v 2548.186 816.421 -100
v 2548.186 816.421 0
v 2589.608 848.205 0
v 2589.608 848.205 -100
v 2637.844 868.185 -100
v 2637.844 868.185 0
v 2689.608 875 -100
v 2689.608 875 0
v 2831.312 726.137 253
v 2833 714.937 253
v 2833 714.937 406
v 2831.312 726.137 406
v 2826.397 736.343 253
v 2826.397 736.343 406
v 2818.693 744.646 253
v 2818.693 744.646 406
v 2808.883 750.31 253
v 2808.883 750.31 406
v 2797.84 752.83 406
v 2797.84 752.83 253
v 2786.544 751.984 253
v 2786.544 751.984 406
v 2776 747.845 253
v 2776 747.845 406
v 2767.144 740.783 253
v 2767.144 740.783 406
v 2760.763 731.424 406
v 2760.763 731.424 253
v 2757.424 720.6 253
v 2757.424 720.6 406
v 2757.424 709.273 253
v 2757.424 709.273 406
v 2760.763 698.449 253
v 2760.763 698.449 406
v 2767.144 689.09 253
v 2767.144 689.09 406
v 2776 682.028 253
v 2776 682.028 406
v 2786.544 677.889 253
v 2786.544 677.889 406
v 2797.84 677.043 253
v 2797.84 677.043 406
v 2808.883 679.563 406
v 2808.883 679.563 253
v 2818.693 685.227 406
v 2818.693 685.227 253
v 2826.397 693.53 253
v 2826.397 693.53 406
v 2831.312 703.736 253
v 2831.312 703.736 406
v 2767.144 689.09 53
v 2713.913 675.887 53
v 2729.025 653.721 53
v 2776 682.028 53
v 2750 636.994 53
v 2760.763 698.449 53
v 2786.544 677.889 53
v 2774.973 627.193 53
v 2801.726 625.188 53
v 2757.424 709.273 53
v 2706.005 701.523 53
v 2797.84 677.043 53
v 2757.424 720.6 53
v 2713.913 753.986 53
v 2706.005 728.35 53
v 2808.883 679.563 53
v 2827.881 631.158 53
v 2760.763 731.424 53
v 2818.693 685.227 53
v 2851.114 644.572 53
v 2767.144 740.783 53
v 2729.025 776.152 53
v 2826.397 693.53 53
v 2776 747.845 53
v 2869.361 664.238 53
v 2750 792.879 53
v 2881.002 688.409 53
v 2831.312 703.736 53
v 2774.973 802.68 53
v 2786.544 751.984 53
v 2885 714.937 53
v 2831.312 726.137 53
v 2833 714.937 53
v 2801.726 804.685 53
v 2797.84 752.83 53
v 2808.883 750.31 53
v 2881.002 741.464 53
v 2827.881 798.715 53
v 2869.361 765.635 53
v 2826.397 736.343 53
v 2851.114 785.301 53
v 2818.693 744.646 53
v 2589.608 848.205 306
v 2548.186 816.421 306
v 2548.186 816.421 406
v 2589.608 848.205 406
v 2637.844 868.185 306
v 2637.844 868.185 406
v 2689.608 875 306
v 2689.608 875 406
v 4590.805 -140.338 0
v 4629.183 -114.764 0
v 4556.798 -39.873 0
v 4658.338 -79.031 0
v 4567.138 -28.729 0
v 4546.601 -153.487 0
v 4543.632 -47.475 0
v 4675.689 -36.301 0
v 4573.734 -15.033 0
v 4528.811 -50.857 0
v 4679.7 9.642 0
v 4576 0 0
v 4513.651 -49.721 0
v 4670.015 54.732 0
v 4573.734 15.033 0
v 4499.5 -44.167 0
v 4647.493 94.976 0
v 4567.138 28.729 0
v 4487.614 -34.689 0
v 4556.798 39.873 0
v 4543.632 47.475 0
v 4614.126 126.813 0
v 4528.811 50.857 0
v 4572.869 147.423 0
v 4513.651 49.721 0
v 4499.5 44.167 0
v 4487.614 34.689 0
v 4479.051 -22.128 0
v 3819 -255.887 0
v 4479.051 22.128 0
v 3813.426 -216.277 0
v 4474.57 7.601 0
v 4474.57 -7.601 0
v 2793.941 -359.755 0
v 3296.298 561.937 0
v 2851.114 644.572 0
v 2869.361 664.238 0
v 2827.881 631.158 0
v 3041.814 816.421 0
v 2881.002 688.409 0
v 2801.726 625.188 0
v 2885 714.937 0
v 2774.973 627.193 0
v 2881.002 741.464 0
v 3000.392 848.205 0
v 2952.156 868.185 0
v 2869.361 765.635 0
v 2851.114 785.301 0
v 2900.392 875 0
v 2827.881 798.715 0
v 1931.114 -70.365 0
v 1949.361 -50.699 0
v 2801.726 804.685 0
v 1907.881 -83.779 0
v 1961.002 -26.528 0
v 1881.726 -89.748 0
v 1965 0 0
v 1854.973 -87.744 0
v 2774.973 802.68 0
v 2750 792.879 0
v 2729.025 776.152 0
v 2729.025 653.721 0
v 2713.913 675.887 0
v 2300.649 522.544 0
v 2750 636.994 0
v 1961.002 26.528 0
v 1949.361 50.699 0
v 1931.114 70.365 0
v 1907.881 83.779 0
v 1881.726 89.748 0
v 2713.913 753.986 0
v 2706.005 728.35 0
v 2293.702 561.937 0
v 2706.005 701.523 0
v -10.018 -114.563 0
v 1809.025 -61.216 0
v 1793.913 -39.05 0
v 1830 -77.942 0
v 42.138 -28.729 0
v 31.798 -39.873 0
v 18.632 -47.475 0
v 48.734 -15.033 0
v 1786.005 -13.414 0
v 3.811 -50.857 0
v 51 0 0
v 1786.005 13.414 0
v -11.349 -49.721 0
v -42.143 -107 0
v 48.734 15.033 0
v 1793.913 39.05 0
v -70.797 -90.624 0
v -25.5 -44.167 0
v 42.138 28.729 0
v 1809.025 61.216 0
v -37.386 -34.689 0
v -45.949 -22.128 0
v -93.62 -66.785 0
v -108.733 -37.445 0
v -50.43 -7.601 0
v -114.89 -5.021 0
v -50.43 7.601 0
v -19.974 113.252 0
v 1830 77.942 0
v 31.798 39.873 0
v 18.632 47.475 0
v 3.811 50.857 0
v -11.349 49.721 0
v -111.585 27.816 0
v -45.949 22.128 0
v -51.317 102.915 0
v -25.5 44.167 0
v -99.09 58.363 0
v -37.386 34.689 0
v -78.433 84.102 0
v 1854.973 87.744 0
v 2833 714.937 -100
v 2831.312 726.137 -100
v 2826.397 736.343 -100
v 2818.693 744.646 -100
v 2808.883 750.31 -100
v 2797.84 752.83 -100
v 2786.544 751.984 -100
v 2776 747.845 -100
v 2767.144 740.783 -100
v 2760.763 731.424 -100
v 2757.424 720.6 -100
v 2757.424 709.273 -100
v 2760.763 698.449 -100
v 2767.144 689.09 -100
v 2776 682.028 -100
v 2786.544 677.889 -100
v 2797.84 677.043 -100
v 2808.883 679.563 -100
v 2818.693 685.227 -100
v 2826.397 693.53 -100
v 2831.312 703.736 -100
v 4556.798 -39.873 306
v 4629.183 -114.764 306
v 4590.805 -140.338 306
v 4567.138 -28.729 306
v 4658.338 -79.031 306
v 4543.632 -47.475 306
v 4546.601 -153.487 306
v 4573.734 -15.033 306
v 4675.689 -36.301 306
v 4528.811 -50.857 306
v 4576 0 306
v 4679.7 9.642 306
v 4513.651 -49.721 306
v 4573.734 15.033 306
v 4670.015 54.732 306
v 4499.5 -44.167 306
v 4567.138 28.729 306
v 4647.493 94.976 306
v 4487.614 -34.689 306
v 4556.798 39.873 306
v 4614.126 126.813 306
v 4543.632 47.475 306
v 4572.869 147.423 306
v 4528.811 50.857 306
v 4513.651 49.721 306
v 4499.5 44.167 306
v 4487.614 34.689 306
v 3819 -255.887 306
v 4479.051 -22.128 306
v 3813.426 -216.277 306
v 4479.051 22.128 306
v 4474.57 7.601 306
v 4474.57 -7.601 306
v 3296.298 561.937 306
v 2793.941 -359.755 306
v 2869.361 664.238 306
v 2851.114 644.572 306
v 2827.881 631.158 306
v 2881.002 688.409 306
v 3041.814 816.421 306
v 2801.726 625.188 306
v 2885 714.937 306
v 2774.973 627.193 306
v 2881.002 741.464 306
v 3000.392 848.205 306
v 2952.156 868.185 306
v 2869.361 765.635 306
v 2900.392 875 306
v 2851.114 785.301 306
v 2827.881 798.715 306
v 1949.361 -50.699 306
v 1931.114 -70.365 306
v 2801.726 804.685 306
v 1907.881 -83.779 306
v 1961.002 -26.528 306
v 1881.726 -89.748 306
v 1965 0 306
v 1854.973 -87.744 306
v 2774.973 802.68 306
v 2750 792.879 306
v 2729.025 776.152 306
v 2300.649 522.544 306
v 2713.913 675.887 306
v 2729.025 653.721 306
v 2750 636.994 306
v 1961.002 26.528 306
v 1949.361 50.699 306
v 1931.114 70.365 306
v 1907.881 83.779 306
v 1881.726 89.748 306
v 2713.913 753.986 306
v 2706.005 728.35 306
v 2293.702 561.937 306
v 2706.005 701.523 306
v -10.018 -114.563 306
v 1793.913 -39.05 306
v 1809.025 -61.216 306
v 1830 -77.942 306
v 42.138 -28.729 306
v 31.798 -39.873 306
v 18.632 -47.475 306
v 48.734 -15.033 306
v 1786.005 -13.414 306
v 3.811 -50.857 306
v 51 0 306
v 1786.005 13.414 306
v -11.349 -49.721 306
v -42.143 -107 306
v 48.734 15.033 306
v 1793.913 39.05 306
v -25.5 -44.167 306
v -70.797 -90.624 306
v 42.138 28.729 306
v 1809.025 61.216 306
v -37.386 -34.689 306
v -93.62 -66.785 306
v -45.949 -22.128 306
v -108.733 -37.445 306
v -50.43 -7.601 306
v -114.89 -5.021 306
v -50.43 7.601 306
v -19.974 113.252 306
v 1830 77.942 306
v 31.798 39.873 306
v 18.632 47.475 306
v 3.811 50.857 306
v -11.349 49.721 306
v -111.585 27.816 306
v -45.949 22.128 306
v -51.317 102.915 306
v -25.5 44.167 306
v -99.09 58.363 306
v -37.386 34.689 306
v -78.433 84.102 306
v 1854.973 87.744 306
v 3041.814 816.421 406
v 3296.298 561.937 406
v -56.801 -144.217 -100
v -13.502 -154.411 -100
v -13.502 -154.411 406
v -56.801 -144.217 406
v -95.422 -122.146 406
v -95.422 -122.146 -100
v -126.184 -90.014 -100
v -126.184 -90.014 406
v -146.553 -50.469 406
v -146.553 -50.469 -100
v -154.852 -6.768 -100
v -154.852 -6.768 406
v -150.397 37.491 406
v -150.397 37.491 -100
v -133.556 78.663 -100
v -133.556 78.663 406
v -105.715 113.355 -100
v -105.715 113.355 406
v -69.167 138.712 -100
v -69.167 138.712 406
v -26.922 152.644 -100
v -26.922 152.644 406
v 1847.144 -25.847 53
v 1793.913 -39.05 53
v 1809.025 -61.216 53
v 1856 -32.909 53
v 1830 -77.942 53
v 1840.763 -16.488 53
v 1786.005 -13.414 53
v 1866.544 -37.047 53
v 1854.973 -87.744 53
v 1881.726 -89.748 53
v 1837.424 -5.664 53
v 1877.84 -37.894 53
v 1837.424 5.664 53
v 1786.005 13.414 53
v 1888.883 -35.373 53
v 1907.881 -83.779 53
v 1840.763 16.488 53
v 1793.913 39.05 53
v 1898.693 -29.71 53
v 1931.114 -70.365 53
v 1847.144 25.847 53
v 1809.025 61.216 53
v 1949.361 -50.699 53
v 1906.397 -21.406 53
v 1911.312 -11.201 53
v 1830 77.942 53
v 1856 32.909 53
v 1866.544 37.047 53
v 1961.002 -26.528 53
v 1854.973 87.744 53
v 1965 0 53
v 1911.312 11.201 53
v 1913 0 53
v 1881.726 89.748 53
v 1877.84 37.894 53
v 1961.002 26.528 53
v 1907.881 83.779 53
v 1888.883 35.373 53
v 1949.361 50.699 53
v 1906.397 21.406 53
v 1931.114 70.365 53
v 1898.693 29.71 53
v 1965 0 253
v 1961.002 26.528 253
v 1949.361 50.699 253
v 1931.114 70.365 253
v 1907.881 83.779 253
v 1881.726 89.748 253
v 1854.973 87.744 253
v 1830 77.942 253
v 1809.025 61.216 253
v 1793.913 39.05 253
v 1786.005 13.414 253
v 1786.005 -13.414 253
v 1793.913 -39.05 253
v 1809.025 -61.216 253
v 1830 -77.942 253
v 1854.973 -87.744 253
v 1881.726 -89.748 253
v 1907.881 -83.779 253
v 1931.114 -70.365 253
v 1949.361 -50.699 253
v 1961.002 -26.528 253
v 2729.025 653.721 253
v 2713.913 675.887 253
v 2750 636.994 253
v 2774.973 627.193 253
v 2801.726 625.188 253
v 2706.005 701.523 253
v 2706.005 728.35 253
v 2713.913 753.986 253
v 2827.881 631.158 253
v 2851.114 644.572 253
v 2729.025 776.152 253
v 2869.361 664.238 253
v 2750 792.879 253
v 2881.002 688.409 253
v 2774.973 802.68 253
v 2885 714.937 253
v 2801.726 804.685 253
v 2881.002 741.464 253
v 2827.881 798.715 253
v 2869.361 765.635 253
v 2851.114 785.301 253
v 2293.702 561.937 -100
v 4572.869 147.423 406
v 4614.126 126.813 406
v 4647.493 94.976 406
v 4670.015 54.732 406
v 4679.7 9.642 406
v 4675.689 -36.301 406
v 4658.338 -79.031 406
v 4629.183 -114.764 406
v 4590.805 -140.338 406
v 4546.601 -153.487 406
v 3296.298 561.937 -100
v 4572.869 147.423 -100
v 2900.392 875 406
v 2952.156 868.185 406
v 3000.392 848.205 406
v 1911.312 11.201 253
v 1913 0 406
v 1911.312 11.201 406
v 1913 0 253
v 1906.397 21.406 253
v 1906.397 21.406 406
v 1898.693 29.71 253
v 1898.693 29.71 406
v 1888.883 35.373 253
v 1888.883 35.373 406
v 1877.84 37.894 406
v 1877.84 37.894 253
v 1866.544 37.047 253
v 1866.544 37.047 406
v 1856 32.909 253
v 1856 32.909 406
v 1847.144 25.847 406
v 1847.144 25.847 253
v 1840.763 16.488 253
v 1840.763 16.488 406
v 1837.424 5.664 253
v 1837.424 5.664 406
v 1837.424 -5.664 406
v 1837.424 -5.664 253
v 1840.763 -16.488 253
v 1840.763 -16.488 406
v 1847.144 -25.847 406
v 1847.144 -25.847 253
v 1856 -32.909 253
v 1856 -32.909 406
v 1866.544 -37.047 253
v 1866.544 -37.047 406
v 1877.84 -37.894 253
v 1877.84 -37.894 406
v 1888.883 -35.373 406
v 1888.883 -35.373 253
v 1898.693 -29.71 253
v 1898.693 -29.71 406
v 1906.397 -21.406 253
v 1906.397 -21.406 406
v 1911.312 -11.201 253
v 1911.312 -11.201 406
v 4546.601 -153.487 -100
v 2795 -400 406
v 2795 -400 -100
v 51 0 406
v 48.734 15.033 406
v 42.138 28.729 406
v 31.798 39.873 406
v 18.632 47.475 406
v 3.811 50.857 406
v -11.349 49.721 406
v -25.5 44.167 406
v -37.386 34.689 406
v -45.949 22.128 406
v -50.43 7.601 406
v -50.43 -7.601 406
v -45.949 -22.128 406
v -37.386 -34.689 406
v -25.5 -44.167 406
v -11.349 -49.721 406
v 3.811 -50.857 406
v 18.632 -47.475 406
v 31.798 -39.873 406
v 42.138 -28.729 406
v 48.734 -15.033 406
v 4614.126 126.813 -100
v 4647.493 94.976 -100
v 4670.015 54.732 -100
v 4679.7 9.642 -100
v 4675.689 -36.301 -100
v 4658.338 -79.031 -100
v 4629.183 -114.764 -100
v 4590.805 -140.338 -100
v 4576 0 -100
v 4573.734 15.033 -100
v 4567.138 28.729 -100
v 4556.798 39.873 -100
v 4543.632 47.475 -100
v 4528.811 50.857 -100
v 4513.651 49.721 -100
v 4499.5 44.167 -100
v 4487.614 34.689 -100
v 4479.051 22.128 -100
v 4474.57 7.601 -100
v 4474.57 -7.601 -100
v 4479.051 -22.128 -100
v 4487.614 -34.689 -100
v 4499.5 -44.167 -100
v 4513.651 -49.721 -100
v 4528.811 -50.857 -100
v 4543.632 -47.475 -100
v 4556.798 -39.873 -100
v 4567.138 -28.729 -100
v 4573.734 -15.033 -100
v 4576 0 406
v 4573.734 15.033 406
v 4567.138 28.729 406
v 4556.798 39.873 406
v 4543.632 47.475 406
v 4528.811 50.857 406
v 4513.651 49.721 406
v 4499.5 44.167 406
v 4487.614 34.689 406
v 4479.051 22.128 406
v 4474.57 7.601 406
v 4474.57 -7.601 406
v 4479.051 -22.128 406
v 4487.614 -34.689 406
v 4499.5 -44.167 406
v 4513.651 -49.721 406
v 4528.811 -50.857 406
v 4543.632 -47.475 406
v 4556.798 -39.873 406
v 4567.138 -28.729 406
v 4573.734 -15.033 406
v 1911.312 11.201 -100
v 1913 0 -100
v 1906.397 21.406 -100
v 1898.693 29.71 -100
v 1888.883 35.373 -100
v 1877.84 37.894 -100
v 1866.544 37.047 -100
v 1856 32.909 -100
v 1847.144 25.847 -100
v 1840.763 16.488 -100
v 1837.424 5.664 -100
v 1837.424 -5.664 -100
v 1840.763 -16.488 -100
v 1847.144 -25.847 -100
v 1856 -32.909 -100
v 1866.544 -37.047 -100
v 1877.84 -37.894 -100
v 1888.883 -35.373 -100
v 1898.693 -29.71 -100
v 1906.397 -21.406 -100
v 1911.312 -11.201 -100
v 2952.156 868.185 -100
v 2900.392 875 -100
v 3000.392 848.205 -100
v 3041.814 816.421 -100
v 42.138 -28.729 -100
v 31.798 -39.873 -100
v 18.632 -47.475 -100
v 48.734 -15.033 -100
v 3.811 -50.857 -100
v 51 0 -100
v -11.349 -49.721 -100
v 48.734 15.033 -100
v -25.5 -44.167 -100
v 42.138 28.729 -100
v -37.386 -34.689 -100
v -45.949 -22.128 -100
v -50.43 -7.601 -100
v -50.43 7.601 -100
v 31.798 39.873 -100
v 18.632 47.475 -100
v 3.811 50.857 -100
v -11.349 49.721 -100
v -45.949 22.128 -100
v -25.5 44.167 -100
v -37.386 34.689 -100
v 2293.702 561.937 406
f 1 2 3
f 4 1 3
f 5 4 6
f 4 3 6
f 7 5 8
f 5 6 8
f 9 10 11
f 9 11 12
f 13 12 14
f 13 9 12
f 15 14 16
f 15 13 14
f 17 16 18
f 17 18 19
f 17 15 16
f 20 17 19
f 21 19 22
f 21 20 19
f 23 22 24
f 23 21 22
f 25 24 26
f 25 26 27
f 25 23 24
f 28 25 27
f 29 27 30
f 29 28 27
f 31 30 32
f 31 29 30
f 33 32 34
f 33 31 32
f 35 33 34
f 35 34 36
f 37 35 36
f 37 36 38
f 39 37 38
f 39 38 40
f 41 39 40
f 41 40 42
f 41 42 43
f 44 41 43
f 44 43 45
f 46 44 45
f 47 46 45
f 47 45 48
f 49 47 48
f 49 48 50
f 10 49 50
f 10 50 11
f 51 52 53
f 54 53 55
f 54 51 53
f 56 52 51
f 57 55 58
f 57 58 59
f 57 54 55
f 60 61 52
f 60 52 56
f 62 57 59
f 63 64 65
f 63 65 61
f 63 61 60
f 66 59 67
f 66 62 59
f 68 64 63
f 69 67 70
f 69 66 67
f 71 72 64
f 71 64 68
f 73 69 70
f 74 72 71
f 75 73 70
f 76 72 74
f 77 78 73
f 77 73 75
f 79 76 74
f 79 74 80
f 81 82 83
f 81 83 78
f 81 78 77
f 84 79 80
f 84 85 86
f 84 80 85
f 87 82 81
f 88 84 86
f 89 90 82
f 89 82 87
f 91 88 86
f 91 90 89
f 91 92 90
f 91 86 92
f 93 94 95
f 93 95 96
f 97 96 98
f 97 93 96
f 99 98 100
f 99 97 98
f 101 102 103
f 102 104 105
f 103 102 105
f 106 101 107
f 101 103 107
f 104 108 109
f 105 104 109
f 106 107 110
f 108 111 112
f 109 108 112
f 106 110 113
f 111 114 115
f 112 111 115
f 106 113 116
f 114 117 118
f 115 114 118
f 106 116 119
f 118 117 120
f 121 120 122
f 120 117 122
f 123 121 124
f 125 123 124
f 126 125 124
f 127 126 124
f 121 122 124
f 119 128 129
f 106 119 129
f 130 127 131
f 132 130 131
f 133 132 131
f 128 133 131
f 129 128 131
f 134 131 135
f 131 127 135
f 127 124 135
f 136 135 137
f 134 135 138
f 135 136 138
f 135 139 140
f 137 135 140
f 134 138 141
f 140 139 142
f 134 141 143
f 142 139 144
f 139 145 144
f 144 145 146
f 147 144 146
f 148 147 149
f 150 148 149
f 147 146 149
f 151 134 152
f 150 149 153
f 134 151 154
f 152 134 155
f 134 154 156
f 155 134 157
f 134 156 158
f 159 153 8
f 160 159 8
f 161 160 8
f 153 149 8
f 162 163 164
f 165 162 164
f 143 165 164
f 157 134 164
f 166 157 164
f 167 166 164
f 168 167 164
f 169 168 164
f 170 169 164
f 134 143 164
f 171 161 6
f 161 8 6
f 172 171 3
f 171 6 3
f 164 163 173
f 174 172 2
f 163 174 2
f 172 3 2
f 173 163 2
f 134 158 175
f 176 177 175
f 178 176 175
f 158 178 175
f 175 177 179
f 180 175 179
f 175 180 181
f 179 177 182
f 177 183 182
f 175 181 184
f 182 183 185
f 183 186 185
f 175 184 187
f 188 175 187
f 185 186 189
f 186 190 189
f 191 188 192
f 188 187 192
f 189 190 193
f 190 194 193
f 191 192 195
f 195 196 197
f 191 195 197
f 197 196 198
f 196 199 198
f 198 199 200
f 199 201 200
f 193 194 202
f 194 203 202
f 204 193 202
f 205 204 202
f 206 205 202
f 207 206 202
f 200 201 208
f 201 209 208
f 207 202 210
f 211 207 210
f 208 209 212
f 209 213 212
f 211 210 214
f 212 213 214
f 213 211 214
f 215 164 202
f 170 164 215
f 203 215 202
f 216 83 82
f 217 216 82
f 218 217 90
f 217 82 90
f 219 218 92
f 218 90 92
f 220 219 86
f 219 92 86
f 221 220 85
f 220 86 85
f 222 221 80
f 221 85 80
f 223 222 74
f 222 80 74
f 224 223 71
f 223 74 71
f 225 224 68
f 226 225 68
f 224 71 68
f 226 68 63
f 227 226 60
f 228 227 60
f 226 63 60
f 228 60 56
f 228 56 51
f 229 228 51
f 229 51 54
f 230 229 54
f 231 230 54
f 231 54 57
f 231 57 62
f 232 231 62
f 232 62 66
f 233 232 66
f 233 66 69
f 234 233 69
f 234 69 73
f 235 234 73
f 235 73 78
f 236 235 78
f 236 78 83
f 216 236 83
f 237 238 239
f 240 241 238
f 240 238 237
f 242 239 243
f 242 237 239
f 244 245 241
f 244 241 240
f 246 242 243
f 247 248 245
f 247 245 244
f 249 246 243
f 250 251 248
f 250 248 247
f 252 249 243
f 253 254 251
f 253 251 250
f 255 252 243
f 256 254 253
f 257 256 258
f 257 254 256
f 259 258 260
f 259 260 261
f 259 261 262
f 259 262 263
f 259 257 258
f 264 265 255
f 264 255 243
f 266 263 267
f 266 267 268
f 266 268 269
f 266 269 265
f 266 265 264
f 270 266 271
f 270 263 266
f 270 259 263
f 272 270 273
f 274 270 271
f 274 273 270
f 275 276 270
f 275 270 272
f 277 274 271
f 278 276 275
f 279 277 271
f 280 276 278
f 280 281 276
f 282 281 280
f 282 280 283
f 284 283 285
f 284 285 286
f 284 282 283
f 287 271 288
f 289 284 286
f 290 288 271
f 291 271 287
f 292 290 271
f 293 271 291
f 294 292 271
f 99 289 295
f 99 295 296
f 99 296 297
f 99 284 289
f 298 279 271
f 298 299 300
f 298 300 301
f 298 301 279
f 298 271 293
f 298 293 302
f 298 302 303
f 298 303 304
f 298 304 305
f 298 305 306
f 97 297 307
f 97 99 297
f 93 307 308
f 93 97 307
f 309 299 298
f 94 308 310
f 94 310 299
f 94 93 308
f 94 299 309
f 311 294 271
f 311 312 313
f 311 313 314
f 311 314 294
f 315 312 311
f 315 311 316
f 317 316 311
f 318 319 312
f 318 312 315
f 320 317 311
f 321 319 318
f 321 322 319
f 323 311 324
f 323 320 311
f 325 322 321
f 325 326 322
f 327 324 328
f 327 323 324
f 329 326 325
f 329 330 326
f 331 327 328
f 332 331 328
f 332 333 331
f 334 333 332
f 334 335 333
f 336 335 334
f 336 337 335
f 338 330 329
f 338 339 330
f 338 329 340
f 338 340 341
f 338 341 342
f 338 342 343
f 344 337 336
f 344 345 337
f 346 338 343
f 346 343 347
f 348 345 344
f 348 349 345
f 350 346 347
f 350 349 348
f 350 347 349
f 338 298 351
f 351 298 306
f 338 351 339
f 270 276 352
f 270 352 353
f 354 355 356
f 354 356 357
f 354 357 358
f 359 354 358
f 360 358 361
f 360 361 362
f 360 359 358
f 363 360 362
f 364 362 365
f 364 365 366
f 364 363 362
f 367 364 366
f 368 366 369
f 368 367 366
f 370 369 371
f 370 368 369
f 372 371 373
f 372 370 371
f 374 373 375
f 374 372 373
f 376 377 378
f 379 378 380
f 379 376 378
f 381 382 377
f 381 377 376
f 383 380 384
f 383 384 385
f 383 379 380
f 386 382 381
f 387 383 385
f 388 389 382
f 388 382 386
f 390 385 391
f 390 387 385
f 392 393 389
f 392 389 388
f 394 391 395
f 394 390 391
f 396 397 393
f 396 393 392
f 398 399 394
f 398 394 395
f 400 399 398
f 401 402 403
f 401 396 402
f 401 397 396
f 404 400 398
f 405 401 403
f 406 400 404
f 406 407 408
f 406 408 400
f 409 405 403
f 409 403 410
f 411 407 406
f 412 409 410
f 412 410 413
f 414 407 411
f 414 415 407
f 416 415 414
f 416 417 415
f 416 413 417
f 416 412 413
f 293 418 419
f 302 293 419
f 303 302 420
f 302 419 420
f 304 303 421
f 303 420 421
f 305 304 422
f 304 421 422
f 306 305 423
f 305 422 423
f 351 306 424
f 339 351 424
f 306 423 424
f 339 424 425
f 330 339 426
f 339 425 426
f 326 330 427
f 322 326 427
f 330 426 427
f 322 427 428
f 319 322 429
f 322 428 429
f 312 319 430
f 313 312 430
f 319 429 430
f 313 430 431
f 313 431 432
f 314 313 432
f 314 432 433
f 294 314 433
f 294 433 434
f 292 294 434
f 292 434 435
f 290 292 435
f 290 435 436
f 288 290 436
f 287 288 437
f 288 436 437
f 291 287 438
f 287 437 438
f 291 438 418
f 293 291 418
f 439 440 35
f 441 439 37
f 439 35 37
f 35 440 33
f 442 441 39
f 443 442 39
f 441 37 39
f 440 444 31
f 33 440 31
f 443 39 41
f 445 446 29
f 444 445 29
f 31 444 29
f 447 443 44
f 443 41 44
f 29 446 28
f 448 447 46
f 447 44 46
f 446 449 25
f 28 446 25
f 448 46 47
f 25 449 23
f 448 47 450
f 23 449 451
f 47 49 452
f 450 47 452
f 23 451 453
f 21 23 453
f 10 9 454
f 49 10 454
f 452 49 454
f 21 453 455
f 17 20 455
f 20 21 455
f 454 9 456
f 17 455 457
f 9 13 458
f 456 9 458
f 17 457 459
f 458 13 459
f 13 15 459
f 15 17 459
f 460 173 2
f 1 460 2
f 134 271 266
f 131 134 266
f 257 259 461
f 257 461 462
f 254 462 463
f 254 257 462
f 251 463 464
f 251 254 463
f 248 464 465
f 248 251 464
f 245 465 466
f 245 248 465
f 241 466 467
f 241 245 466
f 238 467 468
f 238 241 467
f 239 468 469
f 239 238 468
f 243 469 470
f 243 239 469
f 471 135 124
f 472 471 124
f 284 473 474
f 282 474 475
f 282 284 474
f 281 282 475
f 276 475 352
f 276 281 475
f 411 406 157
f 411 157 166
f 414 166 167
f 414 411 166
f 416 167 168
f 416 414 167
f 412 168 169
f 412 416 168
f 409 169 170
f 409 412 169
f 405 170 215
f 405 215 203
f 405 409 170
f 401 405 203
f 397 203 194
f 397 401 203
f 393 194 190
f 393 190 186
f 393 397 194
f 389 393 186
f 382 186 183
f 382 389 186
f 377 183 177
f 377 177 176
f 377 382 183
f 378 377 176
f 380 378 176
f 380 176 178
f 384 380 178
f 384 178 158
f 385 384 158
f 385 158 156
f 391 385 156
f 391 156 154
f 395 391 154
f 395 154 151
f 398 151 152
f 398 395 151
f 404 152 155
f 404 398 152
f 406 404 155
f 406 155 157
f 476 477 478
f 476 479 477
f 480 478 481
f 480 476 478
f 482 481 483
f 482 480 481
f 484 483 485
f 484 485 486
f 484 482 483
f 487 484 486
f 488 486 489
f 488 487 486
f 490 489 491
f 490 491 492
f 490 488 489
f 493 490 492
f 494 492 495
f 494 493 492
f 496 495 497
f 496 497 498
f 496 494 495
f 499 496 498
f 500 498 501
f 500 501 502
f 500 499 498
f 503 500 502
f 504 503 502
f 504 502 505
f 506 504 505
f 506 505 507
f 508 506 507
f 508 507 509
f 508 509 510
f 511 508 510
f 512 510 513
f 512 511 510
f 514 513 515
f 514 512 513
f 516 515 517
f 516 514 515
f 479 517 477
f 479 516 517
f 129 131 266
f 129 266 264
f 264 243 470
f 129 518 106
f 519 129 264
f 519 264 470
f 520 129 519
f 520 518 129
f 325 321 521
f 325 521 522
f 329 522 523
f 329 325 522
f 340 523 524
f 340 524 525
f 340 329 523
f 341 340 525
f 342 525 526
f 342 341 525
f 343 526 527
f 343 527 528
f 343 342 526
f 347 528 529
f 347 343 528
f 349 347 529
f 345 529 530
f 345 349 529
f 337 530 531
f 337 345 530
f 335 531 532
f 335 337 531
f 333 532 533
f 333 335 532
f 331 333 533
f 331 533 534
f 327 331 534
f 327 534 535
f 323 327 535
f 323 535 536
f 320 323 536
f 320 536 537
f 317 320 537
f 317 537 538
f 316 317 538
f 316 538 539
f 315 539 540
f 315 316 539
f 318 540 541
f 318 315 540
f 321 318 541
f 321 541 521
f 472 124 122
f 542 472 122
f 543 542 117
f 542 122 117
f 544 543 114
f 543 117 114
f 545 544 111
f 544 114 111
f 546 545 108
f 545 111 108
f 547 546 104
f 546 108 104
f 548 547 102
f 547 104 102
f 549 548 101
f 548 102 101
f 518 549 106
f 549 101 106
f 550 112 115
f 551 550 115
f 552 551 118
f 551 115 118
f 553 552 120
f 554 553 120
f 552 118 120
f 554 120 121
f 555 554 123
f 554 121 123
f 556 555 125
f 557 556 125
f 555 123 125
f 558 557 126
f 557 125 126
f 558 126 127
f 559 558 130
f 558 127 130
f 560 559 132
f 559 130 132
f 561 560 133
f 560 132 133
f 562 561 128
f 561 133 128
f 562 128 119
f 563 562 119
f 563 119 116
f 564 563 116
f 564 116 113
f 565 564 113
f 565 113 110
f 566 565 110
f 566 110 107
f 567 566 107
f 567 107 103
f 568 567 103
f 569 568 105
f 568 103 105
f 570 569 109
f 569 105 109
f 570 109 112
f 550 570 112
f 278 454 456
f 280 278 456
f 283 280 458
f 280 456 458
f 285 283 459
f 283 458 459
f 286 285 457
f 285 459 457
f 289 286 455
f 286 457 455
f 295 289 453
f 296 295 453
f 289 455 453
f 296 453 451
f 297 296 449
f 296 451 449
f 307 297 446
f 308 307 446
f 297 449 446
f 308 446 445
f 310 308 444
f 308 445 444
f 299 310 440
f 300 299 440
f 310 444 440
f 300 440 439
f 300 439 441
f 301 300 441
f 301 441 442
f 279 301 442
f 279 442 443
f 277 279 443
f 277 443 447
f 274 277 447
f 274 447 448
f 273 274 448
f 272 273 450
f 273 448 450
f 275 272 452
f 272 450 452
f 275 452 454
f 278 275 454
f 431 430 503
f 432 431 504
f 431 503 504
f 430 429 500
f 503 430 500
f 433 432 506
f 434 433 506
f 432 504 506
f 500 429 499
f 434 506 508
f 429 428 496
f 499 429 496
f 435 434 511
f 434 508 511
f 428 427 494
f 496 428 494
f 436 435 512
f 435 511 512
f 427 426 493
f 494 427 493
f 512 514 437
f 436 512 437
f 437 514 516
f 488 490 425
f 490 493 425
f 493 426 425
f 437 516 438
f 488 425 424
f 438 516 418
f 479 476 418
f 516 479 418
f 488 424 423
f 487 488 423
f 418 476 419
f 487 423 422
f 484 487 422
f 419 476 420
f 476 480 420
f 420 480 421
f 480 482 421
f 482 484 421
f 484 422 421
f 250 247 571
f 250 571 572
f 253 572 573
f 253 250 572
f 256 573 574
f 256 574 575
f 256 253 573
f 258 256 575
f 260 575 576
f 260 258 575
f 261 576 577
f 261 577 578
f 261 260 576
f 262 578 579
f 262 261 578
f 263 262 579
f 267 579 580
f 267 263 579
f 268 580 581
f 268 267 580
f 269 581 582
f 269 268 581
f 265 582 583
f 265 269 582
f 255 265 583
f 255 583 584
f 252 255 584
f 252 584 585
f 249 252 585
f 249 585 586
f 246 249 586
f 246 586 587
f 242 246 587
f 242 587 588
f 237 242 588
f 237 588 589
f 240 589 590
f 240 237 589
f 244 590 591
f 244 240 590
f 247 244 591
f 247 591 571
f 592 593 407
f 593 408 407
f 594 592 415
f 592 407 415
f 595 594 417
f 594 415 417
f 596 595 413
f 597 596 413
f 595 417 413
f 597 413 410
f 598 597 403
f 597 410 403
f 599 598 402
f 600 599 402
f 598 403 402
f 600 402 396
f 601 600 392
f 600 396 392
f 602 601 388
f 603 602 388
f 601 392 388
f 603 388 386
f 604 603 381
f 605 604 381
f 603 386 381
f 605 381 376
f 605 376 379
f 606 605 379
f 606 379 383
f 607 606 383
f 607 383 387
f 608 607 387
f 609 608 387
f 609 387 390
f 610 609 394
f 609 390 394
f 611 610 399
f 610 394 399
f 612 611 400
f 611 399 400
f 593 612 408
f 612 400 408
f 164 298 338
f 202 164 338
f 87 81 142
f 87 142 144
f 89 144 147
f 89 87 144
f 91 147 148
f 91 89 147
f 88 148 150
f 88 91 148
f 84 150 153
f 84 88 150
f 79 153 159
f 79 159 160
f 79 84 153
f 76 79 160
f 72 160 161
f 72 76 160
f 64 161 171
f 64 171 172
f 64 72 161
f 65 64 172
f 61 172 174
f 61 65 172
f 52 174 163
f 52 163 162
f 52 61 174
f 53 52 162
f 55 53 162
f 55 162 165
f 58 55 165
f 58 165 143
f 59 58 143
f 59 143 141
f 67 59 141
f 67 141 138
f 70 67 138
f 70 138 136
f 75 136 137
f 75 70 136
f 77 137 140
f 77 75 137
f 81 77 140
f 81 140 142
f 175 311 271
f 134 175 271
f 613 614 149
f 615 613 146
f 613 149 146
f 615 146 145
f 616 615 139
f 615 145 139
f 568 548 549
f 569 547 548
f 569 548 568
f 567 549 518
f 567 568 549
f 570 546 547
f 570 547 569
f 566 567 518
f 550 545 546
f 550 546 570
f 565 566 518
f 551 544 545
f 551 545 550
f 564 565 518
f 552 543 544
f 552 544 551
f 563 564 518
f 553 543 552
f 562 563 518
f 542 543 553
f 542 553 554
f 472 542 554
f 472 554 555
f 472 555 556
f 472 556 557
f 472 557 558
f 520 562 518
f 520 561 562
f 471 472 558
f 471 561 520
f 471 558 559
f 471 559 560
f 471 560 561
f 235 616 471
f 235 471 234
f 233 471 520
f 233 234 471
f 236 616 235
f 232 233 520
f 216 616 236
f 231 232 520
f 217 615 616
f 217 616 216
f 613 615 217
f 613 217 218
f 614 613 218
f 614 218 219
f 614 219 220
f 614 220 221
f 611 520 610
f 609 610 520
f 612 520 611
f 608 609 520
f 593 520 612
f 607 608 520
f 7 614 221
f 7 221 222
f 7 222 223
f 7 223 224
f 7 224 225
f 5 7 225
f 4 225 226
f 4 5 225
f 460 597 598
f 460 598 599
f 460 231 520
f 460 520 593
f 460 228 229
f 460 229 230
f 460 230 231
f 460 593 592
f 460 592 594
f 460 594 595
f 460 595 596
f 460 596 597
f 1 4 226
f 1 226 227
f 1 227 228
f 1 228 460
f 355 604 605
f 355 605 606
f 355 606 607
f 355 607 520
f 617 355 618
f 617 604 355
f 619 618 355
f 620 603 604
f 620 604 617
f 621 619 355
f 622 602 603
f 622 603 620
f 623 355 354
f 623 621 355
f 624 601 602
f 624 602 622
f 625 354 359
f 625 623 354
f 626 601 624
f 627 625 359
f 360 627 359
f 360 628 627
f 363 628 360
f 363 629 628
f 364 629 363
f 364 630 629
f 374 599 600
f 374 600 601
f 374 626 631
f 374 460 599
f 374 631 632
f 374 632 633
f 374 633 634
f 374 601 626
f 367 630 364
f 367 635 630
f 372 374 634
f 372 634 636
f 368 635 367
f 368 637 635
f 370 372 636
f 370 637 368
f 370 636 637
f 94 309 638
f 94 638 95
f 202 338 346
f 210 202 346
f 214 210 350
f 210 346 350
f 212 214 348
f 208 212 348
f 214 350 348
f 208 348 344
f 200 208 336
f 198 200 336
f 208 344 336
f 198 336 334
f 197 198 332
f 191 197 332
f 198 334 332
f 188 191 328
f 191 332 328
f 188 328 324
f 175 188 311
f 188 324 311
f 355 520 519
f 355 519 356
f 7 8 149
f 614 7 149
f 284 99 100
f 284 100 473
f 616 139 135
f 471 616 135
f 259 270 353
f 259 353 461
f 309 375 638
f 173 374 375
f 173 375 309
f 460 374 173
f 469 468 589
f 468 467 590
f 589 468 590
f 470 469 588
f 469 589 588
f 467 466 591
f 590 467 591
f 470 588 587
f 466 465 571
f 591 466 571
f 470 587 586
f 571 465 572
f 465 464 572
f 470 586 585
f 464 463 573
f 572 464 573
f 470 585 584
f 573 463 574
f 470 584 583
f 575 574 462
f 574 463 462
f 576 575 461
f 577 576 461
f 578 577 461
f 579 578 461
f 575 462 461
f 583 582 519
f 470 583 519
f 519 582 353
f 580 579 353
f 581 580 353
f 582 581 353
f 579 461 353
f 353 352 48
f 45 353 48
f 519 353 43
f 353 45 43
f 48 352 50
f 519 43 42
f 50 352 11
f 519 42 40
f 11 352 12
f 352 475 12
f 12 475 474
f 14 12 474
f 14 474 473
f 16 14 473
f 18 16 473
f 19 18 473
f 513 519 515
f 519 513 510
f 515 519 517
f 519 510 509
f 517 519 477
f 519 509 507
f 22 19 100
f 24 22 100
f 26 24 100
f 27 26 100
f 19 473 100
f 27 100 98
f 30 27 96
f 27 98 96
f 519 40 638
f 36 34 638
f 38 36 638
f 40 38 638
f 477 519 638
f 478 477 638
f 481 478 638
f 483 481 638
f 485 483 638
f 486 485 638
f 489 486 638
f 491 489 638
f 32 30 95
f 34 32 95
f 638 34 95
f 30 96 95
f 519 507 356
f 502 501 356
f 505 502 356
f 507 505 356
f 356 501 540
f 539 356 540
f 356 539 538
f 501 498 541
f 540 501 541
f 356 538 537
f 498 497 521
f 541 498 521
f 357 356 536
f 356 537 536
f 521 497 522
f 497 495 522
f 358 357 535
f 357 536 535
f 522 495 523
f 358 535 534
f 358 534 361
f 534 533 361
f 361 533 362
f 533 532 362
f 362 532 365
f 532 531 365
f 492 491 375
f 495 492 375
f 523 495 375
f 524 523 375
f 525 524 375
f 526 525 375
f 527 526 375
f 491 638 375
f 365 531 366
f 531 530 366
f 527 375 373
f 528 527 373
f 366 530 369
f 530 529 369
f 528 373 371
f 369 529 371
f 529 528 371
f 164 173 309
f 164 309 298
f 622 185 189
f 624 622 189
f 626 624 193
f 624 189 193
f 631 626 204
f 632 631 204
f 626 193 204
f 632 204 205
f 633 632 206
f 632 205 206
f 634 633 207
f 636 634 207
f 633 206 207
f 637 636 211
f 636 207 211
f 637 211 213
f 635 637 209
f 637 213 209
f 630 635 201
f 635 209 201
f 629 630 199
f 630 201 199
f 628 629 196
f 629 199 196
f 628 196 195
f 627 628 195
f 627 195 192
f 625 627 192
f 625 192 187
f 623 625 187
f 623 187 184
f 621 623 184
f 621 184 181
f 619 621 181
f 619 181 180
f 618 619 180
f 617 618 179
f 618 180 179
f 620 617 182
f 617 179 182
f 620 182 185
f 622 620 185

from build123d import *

# Parameters (mm, degrees)
SKETCH1_R           = 38
SKETCH1_R_2         = 51
BOSS_EXTRUDE2_DEPTH = 100
BOSS_EXTRUDE4_START = 306
BOSS_EXTRUDE4_DEPTH = 306
BOSS_EXTRUDE5_START = 53
SKETCH7_R           = 90
SKETCH7_R_2         = 38
BOSS_EXTRUDE5_DEPTH = 53


with BuildPart() as part:
    # Sketch1 → Boss-Extrude2 (new body)
    # profile 1 of 2: a face of its own
    with BuildSketch(Plane.XY):
        with BuildLine():
            Line((4546.601139584, -153.487428699), (2795, -400))
            Line((2795, -400), (-13.502435017, -154.410764679))
            ThreePointArc((-13.502435017, -154.410764679), (-154.85218061, -6.767729338), (-26.922095967, 152.644032798))
            Line((-26.922095967, 152.644032798), (2293.701564181, 561.936500623))
            Line((2293.701564181, 561.936500623), (3296.298435819, 561.936500623))
            Line((3296.298435819, 561.936500623), (4572.869484486, 147.422903428))
            ThreePointArc((4572.869484486, 147.422903428), (4679.41275497, -13.479655139), (4546.601139584, -153.487428699))
        make_face()
        with Locations((1875, 0)):
            Circle(SKETCH1_R, mode=Mode.SUBTRACT)
        with Locations((4525, 0)):
            Circle(SKETCH1_R_2, mode=Mode.SUBTRACT)
        Circle(SKETCH1_R_2, mode=Mode.SUBTRACT)
    # profile 2 of 2: a face of its own
    with BuildSketch(Plane.XY):
        with BuildLine():
            ThreePointArc((2900.392223967, 875), (2976.92891044, 859.775906502), (3041.813580205, 816.421356237))
            Line((3041.813580205, 816.421356237), (3296.298435819, 561.936500623))
            Line((3296.298435819, 561.936500623), (2293.701564181, 561.936500623))
            Line((2293.701564181, 561.936500623), (2548.186419795, 816.421356237))
            ThreePointArc((2548.186419795, 816.421356237), (2613.07108956, 859.775906502), (2689.607776033, 875))
            Line((2689.607776033, 875), (2900.392223967, 875))
        make_face()
        with Locations((2795, 714.936500623)):
            Circle(SKETCH1_R, mode=Mode.SUBTRACT)
    boss_extrude2 = extrude(amount=-BOSS_EXTRUDE2_DEPTH)

    # Sketch4 → Boss-Extrude4 (add)
    with BuildSketch(Plane.XY.offset(BOSS_EXTRUDE4_START)):
        with BuildLine():
            Line((2795, -400), (-13.502435017, -154.410764679))
            ThreePointArc((-13.502435017, -154.410764679), (-154.85218061, -6.767729338), (-26.922095967, 152.644032798))
            Line((-26.922095967, 152.644032798), (2293.701564181, 561.936500623))
            Line((2293.701564181, 561.936500623), (2300.64920185, 522.544492159))
            Line((2300.64920185, 522.544492159), (-19.974458298, 113.252024334))
            ThreePointArc((-19.974458298, 113.252024334), (-114.890327549, -5.021218541), (-10.017935657, -114.562825407))
            Line((-10.017935657, -114.562825407), (2793.941422657, -359.754791807))
            Line((2793.941422657, -359.754791807), (3813.425512366, -216.277125188))
            Line((3813.425512366, -216.277125188), (3819, -255.886784207))
            Line((3819, -255.886784207), (2795, -400))
        make_face()
    extrude(amount=-BOSS_EXTRUDE4_DEPTH)

    # Sketch7 → Boss-Extrude5 (add)
    # profile 1 of 2: a face of its own
    with BuildSketch(Plane.XY.offset(BOSS_EXTRUDE5_START)):
        with Locations((2795, 714.936500623)):
            Circle(SKETCH7_R)
        with Locations((2795, 714.936500623)):
            Circle(SKETCH7_R_2, mode=Mode.SUBTRACT)
    # profile 2 of 2: a face of its own
    with BuildSketch(Plane.XY.offset(BOSS_EXTRUDE5_START)):
        with Locations((1875, 0)):
            Circle(SKETCH7_R)
        with Locations((1875, 0)):
            Circle(SKETCH7_R_2, mode=Mode.SUBTRACT)
    boss_extrude5 = extrude(amount=-BOSS_EXTRUDE5_DEPTH)

    # Mirror2: Boss-Extrude2, Boss-Extrude5 across plane
    add(boss_extrude2.mirror(Plane.XY.offset(153)))
    add(boss_extrude5.mirror(Plane.XY.offset(153)))


solid = part.part
